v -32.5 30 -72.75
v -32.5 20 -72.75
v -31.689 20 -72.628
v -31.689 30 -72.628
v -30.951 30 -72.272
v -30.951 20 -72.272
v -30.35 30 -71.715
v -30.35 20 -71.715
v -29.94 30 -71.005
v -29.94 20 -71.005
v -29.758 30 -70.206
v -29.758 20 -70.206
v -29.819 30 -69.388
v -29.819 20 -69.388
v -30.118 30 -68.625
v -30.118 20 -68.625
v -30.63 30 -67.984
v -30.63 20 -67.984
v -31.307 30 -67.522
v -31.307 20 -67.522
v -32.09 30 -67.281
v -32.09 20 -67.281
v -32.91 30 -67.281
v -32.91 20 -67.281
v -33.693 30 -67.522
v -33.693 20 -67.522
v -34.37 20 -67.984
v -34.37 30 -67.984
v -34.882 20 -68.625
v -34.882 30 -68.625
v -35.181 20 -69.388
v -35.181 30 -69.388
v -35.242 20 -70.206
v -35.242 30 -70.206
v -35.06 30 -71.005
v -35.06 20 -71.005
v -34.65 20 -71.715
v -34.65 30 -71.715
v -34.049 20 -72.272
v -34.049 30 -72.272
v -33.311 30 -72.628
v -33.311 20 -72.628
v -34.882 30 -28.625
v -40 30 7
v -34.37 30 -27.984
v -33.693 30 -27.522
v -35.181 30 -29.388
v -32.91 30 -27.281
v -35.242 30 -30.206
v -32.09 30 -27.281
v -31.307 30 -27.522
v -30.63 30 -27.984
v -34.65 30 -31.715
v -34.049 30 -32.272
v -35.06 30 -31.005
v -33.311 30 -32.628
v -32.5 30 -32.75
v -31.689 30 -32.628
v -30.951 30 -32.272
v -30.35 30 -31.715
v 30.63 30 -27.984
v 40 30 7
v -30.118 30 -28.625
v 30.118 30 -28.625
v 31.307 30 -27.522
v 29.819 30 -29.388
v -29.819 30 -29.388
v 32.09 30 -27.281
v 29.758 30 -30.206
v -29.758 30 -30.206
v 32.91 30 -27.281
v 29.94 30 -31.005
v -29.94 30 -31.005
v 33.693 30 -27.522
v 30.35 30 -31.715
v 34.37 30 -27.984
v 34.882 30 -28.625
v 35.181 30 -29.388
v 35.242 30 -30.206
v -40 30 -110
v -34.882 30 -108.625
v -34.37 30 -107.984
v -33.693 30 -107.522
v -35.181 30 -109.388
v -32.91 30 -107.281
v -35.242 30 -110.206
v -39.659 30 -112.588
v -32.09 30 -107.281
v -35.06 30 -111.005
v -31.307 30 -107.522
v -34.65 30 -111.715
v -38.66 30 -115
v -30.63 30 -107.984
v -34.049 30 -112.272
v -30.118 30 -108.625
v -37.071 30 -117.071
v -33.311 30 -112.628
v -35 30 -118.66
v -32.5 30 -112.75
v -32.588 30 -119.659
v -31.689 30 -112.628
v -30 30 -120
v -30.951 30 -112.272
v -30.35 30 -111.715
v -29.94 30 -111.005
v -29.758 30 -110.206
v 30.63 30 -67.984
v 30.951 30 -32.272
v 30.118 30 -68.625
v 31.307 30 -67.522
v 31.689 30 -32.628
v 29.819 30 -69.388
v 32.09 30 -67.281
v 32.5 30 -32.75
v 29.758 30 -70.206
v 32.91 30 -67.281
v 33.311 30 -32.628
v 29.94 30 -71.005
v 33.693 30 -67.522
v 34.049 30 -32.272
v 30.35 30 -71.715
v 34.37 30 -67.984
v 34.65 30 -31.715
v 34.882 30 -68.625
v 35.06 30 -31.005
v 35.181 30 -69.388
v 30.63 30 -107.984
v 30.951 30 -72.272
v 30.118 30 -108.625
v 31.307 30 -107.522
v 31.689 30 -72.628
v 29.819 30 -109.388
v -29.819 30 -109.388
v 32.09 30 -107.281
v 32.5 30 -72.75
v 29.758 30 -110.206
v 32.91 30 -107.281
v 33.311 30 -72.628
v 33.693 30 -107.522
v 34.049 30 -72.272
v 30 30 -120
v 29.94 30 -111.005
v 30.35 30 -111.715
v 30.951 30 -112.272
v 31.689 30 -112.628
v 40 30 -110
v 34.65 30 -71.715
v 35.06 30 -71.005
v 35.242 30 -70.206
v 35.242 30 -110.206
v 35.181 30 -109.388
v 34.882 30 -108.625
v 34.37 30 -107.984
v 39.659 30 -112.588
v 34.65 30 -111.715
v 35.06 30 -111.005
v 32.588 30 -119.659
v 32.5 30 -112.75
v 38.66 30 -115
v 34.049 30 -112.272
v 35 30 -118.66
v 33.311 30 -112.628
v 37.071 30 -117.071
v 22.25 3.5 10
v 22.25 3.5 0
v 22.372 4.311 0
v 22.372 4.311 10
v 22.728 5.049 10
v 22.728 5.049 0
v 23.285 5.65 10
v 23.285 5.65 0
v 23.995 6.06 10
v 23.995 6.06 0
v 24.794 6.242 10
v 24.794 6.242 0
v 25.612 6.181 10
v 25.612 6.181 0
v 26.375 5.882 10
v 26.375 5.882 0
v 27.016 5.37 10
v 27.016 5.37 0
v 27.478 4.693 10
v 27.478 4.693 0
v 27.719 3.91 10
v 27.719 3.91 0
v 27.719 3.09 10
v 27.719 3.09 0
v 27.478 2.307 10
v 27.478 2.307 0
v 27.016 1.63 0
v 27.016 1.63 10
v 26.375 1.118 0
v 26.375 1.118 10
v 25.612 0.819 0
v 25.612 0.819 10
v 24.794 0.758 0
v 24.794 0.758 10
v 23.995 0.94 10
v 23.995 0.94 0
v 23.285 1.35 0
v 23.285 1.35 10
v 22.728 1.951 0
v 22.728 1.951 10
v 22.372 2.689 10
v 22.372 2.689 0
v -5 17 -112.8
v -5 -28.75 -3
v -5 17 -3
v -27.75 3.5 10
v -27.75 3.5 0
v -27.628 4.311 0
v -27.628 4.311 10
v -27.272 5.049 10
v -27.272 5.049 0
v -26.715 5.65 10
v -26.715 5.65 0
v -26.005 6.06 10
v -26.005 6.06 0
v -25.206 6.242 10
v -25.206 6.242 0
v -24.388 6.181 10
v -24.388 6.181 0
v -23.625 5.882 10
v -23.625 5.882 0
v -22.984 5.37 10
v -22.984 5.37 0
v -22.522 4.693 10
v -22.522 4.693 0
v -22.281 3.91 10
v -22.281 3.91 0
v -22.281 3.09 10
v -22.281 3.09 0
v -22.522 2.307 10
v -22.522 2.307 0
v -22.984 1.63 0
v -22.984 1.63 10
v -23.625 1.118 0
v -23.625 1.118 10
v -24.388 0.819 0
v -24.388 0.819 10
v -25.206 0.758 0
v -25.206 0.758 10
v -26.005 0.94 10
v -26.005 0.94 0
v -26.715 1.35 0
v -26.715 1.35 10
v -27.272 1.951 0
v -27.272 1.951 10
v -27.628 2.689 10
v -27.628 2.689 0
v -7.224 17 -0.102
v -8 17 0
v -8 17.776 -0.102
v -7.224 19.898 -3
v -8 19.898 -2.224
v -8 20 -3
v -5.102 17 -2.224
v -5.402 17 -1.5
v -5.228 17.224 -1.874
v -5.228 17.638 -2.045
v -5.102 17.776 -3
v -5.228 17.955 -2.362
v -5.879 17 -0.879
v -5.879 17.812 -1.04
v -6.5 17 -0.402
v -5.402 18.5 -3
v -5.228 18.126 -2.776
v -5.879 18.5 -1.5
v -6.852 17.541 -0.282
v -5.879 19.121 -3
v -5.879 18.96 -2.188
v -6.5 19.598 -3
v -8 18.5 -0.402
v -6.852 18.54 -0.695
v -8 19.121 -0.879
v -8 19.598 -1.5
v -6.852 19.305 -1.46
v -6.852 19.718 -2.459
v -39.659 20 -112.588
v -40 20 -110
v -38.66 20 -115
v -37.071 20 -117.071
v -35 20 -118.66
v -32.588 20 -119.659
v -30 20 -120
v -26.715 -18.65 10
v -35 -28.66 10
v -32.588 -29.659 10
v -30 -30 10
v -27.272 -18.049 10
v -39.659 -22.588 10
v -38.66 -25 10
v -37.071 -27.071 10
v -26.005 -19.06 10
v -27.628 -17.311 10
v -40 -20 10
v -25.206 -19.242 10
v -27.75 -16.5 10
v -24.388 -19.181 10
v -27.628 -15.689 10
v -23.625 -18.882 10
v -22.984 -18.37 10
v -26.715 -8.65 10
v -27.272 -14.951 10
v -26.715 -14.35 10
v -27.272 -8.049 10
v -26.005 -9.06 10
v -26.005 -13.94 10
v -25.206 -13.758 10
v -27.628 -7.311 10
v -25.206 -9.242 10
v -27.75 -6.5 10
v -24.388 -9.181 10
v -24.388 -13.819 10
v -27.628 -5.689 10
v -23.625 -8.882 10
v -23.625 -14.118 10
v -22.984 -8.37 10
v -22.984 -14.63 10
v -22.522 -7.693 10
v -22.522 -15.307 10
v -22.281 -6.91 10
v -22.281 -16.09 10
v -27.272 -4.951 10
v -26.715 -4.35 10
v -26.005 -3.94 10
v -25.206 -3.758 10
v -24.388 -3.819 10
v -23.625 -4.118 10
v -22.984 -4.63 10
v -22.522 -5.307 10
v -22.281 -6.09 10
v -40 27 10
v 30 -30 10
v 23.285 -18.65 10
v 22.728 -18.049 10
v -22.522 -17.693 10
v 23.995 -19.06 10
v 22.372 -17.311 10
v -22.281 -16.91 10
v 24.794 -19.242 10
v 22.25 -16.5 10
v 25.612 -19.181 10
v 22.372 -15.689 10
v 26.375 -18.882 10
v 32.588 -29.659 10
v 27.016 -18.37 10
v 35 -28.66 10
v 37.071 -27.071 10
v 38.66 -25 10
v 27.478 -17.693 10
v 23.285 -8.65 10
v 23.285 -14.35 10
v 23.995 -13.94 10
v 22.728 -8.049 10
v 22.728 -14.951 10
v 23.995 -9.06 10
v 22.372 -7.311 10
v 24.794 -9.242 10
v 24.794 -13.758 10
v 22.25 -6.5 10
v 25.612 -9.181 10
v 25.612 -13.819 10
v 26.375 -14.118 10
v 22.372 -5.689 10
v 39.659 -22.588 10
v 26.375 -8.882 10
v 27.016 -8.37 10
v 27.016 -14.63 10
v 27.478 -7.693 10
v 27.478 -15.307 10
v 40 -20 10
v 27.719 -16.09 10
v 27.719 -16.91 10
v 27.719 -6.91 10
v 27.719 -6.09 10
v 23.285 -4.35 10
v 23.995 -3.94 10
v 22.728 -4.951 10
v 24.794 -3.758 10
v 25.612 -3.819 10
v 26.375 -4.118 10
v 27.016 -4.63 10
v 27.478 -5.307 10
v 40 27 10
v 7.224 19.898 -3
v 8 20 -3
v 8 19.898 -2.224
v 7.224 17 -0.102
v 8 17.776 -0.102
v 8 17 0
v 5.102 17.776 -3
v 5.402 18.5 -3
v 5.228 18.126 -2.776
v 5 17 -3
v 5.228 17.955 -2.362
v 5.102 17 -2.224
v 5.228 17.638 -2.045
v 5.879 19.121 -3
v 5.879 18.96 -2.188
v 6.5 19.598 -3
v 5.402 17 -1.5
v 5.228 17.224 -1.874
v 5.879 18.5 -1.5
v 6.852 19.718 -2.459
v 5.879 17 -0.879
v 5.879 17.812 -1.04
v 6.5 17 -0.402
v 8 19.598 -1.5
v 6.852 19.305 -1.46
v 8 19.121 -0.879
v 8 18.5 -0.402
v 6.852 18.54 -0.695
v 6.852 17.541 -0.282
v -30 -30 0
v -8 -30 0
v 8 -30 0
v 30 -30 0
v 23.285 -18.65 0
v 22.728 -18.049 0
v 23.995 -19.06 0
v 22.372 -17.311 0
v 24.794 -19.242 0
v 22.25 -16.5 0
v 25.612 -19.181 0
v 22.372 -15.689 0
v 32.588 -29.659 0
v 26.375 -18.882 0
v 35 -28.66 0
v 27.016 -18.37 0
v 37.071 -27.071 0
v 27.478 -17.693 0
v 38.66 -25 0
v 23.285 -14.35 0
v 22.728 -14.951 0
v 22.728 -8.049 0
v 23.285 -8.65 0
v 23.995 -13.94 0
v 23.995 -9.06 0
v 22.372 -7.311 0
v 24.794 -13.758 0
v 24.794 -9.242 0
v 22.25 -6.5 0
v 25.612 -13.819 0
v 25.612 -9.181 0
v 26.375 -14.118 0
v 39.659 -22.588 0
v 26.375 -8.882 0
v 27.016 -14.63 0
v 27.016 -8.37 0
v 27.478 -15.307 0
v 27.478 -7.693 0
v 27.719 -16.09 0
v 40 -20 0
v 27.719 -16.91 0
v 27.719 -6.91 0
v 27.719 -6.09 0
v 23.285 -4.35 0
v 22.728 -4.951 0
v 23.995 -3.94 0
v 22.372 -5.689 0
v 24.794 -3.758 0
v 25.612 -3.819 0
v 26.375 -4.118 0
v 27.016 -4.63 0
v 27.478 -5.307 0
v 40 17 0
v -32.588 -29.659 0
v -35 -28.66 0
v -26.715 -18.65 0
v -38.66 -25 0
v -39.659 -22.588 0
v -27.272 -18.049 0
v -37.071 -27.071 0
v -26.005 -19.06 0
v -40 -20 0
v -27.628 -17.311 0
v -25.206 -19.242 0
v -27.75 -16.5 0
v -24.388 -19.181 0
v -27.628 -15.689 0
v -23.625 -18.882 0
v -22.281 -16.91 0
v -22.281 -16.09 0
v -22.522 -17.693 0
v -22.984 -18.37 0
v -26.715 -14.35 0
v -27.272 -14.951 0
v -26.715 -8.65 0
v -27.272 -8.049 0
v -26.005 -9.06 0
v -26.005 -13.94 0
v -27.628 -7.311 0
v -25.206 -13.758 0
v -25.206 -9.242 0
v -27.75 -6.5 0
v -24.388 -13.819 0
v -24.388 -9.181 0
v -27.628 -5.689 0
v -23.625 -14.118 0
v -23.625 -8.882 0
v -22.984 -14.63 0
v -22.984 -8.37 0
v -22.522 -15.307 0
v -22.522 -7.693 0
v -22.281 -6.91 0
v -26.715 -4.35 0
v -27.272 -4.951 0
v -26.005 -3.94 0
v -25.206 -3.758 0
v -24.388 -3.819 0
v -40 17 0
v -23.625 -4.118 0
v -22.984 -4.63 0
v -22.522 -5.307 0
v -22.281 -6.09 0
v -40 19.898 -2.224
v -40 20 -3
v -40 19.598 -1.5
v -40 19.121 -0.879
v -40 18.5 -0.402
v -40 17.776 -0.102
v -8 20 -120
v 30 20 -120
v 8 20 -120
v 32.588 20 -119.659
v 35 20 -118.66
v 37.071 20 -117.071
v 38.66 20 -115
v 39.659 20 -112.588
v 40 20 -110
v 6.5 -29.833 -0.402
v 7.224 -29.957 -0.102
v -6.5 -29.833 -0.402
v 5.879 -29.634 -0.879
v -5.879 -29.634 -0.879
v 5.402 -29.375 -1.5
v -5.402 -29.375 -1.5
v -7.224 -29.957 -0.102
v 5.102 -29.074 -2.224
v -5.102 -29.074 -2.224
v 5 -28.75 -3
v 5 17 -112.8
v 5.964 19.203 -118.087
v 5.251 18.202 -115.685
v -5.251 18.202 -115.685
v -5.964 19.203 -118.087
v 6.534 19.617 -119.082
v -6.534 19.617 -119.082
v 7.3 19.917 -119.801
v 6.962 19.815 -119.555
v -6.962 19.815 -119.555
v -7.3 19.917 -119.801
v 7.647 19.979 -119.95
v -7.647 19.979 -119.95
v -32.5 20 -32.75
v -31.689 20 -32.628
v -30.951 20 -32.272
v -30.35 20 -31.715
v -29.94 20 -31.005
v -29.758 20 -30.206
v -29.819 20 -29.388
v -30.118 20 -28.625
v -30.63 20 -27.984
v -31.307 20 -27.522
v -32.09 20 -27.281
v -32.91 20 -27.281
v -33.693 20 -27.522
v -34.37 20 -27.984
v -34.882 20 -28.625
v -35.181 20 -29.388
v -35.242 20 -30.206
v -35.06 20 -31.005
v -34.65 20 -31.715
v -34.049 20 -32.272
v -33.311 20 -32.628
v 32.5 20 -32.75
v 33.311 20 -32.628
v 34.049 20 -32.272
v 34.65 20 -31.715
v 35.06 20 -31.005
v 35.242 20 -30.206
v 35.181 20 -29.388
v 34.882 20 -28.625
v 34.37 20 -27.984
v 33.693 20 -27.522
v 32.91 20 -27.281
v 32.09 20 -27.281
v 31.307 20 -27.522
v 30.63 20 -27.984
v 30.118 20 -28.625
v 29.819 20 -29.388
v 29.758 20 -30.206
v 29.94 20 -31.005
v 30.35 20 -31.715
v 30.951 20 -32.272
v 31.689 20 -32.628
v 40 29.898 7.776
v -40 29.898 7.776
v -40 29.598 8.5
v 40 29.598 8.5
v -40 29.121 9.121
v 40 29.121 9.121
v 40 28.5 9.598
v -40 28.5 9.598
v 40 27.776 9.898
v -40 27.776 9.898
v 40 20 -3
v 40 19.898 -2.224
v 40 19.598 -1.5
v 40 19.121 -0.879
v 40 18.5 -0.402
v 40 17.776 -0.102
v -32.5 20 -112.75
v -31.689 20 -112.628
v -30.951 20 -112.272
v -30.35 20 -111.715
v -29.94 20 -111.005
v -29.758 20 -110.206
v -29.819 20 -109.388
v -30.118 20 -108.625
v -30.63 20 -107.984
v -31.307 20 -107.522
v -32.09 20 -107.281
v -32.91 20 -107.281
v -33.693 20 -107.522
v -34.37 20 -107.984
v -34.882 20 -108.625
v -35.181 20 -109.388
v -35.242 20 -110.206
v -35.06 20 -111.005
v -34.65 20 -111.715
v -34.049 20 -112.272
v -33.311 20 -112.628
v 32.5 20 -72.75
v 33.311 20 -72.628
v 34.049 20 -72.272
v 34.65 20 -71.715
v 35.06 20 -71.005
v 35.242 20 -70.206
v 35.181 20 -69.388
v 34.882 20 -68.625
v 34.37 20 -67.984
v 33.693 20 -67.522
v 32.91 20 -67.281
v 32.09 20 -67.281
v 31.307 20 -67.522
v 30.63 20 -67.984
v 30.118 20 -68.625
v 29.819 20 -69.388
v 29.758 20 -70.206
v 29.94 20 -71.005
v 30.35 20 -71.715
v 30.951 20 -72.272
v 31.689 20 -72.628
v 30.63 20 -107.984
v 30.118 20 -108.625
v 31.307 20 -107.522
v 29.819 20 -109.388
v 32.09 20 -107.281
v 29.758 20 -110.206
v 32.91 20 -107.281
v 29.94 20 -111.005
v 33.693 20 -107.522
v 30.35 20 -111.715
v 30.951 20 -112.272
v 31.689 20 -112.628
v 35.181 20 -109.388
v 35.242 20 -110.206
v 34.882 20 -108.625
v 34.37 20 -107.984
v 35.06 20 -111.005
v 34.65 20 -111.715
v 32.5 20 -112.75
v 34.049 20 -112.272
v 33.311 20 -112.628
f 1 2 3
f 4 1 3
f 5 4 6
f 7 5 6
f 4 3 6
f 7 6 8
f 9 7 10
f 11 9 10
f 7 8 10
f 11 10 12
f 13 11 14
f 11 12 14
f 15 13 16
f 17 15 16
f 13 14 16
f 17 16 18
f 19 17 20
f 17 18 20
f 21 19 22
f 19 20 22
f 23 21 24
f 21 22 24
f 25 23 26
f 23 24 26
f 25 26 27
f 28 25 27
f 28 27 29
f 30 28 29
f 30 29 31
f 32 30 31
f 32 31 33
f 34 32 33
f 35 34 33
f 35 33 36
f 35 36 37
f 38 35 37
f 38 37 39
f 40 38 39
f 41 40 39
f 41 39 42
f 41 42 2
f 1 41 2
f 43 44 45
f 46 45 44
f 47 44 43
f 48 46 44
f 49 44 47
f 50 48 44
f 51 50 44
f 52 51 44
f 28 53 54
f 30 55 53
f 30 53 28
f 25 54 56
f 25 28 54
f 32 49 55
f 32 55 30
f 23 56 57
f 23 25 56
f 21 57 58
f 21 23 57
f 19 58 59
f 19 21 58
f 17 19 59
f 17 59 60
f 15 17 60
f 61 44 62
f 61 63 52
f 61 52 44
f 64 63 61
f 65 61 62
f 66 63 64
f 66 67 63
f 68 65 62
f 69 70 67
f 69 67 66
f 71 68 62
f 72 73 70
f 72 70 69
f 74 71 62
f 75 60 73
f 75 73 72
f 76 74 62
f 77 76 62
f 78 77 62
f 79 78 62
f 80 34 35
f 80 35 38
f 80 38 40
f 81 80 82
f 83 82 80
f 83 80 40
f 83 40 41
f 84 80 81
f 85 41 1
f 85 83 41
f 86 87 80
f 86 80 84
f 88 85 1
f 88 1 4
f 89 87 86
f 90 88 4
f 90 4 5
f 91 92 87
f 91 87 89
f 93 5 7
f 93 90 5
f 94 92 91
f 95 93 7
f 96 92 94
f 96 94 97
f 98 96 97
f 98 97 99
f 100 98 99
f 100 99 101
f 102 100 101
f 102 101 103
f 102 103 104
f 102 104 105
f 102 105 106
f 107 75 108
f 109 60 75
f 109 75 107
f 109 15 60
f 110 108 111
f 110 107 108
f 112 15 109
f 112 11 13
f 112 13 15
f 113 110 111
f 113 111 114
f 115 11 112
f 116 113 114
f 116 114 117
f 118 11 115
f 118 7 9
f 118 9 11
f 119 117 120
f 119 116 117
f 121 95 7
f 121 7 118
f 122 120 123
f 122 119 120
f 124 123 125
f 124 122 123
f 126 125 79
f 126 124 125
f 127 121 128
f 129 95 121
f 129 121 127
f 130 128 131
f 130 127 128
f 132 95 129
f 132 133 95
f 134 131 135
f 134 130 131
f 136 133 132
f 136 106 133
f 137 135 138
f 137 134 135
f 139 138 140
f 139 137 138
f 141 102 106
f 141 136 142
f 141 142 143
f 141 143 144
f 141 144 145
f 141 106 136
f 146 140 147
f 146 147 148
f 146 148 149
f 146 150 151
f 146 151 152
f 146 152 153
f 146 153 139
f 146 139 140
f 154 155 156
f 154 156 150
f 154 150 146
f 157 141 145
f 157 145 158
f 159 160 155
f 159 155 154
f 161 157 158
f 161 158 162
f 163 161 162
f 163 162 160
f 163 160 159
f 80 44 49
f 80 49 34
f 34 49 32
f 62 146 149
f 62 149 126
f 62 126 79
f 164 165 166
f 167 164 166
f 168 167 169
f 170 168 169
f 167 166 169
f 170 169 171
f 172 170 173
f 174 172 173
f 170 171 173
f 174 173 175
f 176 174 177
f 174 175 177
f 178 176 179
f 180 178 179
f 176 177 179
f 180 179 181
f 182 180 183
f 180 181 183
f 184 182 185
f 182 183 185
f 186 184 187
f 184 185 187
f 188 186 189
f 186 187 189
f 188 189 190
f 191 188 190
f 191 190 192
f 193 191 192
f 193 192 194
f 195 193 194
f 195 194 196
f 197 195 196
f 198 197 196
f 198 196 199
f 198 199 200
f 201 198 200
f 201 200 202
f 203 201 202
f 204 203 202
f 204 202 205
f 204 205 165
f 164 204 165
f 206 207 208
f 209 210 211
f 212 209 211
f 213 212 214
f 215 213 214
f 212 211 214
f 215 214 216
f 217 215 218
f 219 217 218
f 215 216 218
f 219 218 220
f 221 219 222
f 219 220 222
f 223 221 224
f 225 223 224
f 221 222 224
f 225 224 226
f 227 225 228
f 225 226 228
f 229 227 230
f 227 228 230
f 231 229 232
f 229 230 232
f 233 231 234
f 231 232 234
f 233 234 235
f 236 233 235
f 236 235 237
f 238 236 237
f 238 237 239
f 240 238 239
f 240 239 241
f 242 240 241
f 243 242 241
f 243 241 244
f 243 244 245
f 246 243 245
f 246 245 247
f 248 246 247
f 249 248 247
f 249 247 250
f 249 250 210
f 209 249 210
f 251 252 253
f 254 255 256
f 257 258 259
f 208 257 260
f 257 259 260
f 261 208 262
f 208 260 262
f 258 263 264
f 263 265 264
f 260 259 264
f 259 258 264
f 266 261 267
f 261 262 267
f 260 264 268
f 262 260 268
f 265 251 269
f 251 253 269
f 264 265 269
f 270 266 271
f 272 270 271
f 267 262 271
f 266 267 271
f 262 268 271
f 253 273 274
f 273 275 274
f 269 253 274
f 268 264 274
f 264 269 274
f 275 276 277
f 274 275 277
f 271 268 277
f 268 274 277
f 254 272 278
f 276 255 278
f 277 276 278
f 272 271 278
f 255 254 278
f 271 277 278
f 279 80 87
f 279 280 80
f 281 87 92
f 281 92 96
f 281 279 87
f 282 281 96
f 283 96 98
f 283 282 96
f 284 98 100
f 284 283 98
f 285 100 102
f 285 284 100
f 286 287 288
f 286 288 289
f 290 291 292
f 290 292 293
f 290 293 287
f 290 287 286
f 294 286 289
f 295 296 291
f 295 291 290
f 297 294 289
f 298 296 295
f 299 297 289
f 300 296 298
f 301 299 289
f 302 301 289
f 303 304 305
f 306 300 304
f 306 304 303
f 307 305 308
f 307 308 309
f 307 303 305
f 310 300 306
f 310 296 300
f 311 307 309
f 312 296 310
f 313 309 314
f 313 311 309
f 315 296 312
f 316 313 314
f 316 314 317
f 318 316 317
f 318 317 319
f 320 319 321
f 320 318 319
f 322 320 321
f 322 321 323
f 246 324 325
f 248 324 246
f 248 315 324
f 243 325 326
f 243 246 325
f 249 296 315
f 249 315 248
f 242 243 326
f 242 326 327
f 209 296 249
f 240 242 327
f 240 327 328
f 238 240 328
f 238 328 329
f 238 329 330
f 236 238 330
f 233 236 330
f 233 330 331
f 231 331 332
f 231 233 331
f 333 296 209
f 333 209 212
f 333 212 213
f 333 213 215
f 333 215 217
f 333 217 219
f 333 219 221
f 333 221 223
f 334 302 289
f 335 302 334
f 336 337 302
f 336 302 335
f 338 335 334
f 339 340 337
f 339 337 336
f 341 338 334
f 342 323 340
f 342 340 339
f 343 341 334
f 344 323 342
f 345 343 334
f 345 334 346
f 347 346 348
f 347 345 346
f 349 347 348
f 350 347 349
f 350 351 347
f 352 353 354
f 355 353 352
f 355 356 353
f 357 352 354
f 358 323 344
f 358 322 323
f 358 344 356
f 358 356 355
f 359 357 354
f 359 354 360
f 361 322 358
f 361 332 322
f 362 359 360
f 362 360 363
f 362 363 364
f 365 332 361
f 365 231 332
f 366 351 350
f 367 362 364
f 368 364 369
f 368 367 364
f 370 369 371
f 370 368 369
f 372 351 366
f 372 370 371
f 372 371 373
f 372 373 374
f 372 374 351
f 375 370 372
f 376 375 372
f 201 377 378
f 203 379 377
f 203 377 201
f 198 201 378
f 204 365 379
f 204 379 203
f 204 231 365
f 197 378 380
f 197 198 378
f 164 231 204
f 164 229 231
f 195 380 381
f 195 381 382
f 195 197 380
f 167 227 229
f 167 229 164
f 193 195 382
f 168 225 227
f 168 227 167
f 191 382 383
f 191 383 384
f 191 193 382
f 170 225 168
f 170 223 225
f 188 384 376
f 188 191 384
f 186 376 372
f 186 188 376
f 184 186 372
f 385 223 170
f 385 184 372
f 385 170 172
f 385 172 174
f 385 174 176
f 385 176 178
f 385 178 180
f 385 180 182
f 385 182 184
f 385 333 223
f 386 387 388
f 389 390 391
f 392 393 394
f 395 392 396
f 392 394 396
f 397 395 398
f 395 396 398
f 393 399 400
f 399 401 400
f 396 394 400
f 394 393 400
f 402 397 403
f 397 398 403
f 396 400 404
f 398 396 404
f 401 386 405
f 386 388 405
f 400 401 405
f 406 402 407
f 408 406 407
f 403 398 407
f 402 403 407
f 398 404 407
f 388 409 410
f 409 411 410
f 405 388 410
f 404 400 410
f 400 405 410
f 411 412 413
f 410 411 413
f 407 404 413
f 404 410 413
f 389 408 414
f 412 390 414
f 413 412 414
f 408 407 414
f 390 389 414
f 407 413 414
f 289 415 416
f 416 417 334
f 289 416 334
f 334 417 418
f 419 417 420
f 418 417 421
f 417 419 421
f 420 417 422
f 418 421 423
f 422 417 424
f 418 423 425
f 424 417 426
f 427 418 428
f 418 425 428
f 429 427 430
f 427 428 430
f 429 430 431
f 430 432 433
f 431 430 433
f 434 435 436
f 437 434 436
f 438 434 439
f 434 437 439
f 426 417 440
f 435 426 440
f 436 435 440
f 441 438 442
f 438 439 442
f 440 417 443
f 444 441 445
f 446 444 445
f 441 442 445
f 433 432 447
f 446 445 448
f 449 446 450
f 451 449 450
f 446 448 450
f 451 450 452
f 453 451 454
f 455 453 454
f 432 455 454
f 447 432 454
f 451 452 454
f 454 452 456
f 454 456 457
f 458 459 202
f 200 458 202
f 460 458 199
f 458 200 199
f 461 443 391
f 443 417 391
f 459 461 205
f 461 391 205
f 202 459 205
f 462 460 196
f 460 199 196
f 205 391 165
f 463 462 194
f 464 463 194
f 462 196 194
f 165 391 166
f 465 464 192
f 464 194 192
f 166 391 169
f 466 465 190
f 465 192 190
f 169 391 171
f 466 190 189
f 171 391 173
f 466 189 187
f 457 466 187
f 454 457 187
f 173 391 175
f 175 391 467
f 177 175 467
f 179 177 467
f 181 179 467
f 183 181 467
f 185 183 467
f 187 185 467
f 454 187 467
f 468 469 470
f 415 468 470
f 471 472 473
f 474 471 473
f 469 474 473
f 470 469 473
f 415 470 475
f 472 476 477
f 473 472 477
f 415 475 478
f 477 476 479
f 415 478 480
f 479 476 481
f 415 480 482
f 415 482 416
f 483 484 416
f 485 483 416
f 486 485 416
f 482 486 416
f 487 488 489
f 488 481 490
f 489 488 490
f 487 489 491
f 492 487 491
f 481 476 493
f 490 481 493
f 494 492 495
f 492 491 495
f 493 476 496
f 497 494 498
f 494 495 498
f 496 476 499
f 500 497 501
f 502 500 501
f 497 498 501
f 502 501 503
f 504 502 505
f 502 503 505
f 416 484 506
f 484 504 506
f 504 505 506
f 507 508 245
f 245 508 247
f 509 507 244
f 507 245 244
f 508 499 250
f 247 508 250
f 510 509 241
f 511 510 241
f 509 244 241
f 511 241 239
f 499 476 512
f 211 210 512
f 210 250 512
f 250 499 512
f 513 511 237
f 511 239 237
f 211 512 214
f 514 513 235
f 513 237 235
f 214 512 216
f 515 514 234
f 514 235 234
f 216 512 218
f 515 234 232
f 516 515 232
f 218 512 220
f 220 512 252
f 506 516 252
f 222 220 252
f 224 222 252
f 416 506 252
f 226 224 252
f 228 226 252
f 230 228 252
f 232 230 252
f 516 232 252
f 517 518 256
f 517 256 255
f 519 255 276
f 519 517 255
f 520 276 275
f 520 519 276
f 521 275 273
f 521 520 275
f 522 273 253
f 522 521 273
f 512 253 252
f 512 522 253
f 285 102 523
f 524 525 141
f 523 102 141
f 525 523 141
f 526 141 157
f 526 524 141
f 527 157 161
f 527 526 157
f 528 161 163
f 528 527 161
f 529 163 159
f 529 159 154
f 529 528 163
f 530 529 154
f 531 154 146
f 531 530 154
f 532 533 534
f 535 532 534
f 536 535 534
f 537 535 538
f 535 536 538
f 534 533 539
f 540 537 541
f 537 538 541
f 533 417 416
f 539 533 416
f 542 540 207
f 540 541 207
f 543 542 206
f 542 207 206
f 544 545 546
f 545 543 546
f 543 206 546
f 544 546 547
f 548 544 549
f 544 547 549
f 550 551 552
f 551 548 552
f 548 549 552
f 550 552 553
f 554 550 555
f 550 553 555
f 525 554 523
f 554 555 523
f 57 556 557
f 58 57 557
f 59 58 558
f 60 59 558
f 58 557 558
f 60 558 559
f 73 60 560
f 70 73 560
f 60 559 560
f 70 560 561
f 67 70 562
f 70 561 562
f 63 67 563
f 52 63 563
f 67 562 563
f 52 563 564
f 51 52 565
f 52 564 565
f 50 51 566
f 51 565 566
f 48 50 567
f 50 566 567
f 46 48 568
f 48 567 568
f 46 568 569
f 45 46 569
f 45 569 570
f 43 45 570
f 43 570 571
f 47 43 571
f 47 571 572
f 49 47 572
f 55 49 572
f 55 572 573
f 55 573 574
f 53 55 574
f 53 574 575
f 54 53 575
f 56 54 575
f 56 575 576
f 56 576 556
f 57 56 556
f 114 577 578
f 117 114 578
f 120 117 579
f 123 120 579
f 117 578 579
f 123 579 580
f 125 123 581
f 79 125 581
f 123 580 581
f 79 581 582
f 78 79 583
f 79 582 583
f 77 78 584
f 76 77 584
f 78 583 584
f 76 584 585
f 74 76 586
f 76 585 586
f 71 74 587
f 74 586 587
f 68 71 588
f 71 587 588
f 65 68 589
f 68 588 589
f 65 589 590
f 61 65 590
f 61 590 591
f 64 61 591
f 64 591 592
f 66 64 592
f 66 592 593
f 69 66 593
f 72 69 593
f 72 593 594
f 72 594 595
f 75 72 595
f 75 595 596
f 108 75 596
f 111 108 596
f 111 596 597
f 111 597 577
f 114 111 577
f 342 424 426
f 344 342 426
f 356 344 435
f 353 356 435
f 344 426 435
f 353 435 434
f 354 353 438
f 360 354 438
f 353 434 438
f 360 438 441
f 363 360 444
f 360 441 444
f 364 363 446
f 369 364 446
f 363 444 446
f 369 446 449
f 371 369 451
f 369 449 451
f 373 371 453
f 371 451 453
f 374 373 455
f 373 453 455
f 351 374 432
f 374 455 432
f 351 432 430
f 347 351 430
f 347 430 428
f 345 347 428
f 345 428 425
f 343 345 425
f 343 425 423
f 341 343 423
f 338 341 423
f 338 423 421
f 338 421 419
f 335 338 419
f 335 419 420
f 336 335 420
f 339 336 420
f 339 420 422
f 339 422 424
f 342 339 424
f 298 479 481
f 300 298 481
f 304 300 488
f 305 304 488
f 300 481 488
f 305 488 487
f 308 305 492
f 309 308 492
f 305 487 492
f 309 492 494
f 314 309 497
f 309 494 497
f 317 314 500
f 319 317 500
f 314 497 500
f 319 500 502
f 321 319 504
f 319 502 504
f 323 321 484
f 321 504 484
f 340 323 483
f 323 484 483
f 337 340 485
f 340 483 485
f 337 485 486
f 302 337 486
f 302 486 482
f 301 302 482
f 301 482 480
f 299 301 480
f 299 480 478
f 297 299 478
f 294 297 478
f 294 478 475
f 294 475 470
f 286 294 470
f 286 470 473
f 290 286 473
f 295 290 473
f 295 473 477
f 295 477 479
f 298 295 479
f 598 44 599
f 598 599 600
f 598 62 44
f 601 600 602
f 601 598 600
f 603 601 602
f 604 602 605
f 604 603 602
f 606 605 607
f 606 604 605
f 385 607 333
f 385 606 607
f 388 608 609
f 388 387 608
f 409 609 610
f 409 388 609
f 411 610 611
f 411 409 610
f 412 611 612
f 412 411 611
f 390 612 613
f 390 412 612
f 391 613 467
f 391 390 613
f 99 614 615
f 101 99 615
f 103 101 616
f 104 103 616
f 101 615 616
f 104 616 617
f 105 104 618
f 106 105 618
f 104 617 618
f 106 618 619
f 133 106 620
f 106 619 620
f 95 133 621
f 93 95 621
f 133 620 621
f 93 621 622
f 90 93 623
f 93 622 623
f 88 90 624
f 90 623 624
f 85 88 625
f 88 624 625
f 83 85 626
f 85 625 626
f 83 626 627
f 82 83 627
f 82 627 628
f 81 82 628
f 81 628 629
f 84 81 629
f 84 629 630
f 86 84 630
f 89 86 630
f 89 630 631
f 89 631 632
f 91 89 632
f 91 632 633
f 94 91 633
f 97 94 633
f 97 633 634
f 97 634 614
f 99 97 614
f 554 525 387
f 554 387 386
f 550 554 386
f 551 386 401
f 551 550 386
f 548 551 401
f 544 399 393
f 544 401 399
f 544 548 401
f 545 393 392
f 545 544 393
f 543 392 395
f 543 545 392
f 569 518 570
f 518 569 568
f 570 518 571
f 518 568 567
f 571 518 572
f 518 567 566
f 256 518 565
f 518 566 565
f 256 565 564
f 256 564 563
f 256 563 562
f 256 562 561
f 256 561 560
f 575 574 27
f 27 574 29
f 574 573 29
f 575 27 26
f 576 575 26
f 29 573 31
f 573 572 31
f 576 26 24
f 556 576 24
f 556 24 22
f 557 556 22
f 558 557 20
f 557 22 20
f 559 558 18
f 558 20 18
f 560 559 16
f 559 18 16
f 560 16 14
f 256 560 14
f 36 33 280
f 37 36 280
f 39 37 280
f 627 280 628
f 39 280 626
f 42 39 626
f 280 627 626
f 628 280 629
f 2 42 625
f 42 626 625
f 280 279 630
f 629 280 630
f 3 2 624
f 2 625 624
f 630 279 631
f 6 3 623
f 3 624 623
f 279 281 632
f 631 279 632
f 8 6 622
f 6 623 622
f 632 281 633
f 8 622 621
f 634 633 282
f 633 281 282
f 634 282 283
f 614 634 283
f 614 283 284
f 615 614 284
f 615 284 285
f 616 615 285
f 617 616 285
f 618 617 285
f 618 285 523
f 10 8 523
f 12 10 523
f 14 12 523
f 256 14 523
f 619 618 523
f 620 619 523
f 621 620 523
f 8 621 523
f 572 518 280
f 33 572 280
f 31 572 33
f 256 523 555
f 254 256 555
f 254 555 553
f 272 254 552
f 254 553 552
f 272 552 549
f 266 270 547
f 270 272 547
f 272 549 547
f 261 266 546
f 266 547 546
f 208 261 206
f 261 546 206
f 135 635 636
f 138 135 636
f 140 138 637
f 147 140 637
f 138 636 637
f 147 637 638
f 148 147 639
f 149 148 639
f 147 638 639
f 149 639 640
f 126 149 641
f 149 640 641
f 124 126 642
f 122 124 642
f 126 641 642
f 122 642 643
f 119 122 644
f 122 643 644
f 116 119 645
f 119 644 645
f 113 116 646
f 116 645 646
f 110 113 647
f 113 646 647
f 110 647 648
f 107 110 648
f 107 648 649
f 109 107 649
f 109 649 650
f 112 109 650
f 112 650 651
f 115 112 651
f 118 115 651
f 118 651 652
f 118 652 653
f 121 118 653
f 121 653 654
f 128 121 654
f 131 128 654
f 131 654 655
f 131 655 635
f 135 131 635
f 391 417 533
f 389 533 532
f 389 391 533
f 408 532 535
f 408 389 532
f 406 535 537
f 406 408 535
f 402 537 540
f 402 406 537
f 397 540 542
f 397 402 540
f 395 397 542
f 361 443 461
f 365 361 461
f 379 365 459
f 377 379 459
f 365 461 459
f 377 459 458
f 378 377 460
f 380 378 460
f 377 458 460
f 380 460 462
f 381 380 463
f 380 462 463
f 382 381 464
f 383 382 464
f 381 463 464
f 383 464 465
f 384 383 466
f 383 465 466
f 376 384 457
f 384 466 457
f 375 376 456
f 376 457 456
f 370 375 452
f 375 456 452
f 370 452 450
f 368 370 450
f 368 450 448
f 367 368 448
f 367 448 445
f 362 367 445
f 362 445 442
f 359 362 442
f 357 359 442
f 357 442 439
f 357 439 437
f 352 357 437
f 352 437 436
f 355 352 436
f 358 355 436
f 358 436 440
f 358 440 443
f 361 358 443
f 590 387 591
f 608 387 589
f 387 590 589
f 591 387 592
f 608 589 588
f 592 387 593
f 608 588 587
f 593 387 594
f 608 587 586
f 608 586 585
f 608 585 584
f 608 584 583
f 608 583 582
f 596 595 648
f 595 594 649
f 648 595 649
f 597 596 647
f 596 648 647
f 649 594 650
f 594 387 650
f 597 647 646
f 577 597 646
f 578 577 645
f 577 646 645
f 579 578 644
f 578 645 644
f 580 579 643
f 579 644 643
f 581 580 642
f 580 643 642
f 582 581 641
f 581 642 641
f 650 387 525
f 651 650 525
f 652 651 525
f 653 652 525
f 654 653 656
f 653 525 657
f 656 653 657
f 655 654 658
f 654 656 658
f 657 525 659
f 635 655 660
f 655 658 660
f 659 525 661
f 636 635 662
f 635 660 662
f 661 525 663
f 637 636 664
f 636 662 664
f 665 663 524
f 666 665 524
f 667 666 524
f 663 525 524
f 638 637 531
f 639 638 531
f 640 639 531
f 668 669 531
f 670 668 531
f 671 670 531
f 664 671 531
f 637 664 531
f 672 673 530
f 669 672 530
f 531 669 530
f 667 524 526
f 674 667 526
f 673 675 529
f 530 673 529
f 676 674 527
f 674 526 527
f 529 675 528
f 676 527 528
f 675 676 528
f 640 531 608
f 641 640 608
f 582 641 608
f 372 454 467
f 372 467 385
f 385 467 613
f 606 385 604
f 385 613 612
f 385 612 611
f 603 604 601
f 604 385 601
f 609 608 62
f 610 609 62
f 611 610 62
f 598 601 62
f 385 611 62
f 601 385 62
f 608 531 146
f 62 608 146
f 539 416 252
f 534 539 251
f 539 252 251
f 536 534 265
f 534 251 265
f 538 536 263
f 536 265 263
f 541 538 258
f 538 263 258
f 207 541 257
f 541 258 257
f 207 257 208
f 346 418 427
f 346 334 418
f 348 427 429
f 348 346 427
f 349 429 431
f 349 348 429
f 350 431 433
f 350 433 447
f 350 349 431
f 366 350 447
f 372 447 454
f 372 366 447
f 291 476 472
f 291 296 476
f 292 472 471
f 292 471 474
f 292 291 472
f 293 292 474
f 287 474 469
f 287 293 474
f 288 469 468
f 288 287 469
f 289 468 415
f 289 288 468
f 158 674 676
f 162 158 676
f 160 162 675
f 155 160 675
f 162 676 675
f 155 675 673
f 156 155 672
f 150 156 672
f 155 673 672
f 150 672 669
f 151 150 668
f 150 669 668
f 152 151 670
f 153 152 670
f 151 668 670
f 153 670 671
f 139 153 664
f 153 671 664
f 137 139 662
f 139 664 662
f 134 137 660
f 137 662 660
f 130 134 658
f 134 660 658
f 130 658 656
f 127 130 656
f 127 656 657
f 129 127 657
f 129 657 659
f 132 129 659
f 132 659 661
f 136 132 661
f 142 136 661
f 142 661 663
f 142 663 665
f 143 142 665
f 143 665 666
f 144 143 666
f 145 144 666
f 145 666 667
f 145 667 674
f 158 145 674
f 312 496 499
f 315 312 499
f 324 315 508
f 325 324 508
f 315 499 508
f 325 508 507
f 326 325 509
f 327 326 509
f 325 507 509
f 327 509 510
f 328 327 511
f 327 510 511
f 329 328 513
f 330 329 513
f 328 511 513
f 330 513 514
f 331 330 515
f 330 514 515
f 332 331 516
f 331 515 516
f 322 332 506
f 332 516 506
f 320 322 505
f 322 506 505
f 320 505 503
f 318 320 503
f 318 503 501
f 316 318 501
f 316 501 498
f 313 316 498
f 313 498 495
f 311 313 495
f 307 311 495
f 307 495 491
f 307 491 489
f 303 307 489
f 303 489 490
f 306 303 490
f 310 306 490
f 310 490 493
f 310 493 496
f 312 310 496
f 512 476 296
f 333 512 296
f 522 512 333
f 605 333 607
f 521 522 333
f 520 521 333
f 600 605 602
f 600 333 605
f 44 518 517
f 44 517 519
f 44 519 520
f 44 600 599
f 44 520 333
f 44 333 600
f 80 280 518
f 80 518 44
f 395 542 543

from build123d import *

# Parameters (mm, degrees)
SKETCH1_W           = 80
SKETCH1_H           = 60
BOSS_EXTRUDE1_DEPTH = 10
SKETCH2_W           = 80
SKETCH2_H           = 130
BOSS_EXTRUDE2_DEPTH = 10
CUT_EXTRUDE1_REACH  = 132
SKETCH3_R           = 2.75
CUT_EXTRUDE2_REACH  = 138.015
SKETCH4_R           = 2.75
SKETCH5_W           = 10
SKETCH5_H           = 50
BOSS_EXTRUDE3_DEPTH = 120
CUT_EXTRUDE3_REACH  = 133.624
FILLET1_R           = 10
FILLET2_R           = 3
FILLET3_R           = 3


with BuildPart() as part:
    # Sketch1 → Boss-Extrude1 (new body)
    with BuildSketch(Plane.XY):
        Rectangle(SKETCH1_W, SKETCH1_H)
    extrude(amount=BOSS_EXTRUDE1_DEPTH)

    # Sketch2 → Boss-Extrude2 (add)
    with BuildSketch(Plane(origin=(0, 30, 0), x_dir=(1, 0, 0), z_dir=(0, 1, 0))):
        with Locations((0, 55)):
            Rectangle(SKETCH2_W, SKETCH2_H)
    extrude(amount=-BOSS_EXTRUDE2_DEPTH)

    # Sketch3 → Cut-Extrude1 (cut, up to next)
    with BuildSketch(Plane(origin=(0, 0, 0), x_dir=(-1, 0, 0), z_dir=(0, 0, -1)), mode=Mode.PRIVATE) as cut_extrude1_sk1:
        with Locations((-25, -16.5)):
            Circle(SKETCH3_R)
    cut_extrude1_tool1 = extrude(cut_extrude1_sk1.sketch, amount=-CUT_EXTRUDE1_REACH, mode=Mode.PRIVATE) & part.part
    # Sketch3 → Cut-Extrude1 (cut, up to next)
    with BuildSketch(Plane(origin=(0, 0, 0), x_dir=(-1, 0, 0), z_dir=(0, 0, -1)), mode=Mode.PRIVATE) as cut_extrude1_sk2:
        with Locations((25, -16.5)):
            Circle(SKETCH3_R)
    cut_extrude1_tool2 = extrude(cut_extrude1_sk2.sketch, amount=-CUT_EXTRUDE1_REACH, mode=Mode.PRIVATE) & part.part
    # Sketch3 → Cut-Extrude1 (cut, up to next)
    with BuildSketch(Plane(origin=(0, 0, 0), x_dir=(-1, 0, 0), z_dir=(0, 0, -1)), mode=Mode.PRIVATE) as cut_extrude1_sk3:
        with Locations((-25, -6.5)):
            Circle(SKETCH3_R)
    cut_extrude1_tool3 = extrude(cut_extrude1_sk3.sketch, amount=-CUT_EXTRUDE1_REACH, mode=Mode.PRIVATE) & part.part
    # Sketch3 → Cut-Extrude1 (cut, up to next)
    with BuildSketch(Plane(origin=(0, 0, 0), x_dir=(-1, 0, 0), z_dir=(0, 0, -1)), mode=Mode.PRIVATE) as cut_extrude1_sk4:
        with Locations((25, -6.5)):
            Circle(SKETCH3_R)
    cut_extrude1_tool4 = extrude(cut_extrude1_sk4.sketch, amount=-CUT_EXTRUDE1_REACH, mode=Mode.PRIVATE) & part.part
    # Sketch3 → Cut-Extrude1 (cut, up to next)
    with BuildSketch(Plane(origin=(0, 0, 0), x_dir=(-1, 0, 0), z_dir=(0, 0, -1)), mode=Mode.PRIVATE) as cut_extrude1_sk5:
        with Locations((-25, 3.5)):
            Circle(SKETCH3_R)
    cut_extrude1_tool5 = extrude(cut_extrude1_sk5.sketch, amount=-CUT_EXTRUDE1_REACH, mode=Mode.PRIVATE) & part.part
    # Sketch3 → Cut-Extrude1 (cut, up to next)
    with BuildSketch(Plane(origin=(0, 0, 0), x_dir=(-1, 0, 0), z_dir=(0, 0, -1)), mode=Mode.PRIVATE) as cut_extrude1_sk6:
        with Locations((25, 3.5)):
            Circle(SKETCH3_R)
    cut_extrude1_tool6 = extrude(cut_extrude1_sk6.sketch, amount=-CUT_EXTRUDE1_REACH, mode=Mode.PRIVATE) & part.part
    add(cut_extrude1_tool1.solids().sort_by_distance((25, -16.5, 0))[0], mode=Mode.SUBTRACT)
    add(cut_extrude1_tool2.solids().sort_by_distance((-25, -16.5, 0))[0], mode=Mode.SUBTRACT)
    add(cut_extrude1_tool3.solids().sort_by_distance((25, -6.5, 0))[0], mode=Mode.SUBTRACT)
    add(cut_extrude1_tool4.solids().sort_by_distance((-25, -6.5, 0))[0], mode=Mode.SUBTRACT)
    add(cut_extrude1_tool5.solids().sort_by_distance((25, 3.5, 0))[0], mode=Mode.SUBTRACT)
    add(cut_extrude1_tool6.solids().sort_by_distance((-25, 3.5, 0))[0], mode=Mode.SUBTRACT)

    # Sketch4 → Cut-Extrude2 (cut, up to next)
    with BuildSketch(Plane.XZ.offset(-20), mode=Mode.PRIVATE) as cut_extrude2_sk1:
        with Locations(Location((-32.5, -110, 0), (0, 0, 270))):
            Circle(SKETCH4_R)
    cut_extrude2_tool1 = extrude(cut_extrude2_sk1.sketch, amount=-CUT_EXTRUDE2_REACH, mode=Mode.PRIVATE) & part.part
    # Sketch4 → Cut-Extrude2 (cut, up to next)
    with BuildSketch(Plane.XZ.offset(-20), mode=Mode.PRIVATE) as cut_extrude2_sk2:
        with Locations(Location((32.5, -110, 0), (0, 0, 270))):
            Circle(SKETCH4_R)
    cut_extrude2_tool2 = extrude(cut_extrude2_sk2.sketch, amount=-CUT_EXTRUDE2_REACH, mode=Mode.PRIVATE) & part.part
    # Sketch4 → Cut-Extrude2 (cut, up to next)
    with BuildSketch(Plane.XZ.offset(-20), mode=Mode.PRIVATE) as cut_extrude2_sk3:
        with Locations(Location((-32.5, -70, 0), (0, 0, 270))):
            Circle(SKETCH4_R)
    cut_extrude2_tool3 = extrude(cut_extrude2_sk3.sketch, amount=-CUT_EXTRUDE2_REACH, mode=Mode.PRIVATE) & part.part
    # Sketch4 → Cut-Extrude2 (cut, up to next)
    with BuildSketch(Plane.XZ.offset(-20), mode=Mode.PRIVATE) as cut_extrude2_sk4:
        with Locations(Location((32.5, -70, 0), (0, 0, 270))):
            Circle(SKETCH4_R)
    cut_extrude2_tool4 = extrude(cut_extrude2_sk4.sketch, amount=-CUT_EXTRUDE2_REACH, mode=Mode.PRIVATE) & part.part
    # Sketch4 → Cut-Extrude2 (cut, up to next)
    with BuildSketch(Plane.XZ.offset(-20), mode=Mode.PRIVATE) as cut_extrude2_sk5:
        with Locations(Location((-32.5, -30, 0), (0, 0, 270))):
            Circle(SKETCH4_R)
    cut_extrude2_tool5 = extrude(cut_extrude2_sk5.sketch, amount=-CUT_EXTRUDE2_REACH, mode=Mode.PRIVATE) & part.part
    # Sketch4 → Cut-Extrude2 (cut, up to next)
    with BuildSketch(Plane.XZ.offset(-20), mode=Mode.PRIVATE) as cut_extrude2_sk6:
        with Locations(Location((32.5, -30, 0), (0, 0, 270))):
            Circle(SKETCH4_R)
    cut_extrude2_tool6 = extrude(cut_extrude2_sk6.sketch, amount=-CUT_EXTRUDE2_REACH, mode=Mode.PRIVATE) & part.part
    add(cut_extrude2_tool1.solids().sort_by_distance((-32.5, 20, -110))[0], mode=Mode.SUBTRACT)
    add(cut_extrude2_tool2.solids().sort_by_distance((32.5, 20, -110))[0], mode=Mode.SUBTRACT)
    add(cut_extrude2_tool3.solids().sort_by_distance((-32.5, 20, -70))[0], mode=Mode.SUBTRACT)
    add(cut_extrude2_tool4.solids().sort_by_distance((32.5, 20, -70))[0], mode=Mode.SUBTRACT)
    add(cut_extrude2_tool5.solids().sort_by_distance((-32.5, 20, -30))[0], mode=Mode.SUBTRACT)
    add(cut_extrude2_tool6.solids().sort_by_distance((32.5, 20, -30))[0], mode=Mode.SUBTRACT)

    # Sketch5 → Boss-Extrude3 (add)
    with BuildSketch(Plane(origin=(0, 0, 0), x_dir=(-1, 0, 0), z_dir=(0, 0, -1))):
        with Locations((0, -5)):
            Rectangle(SKETCH5_W, SKETCH5_H)
    extrude(amount=BOSS_EXTRUDE3_DEPTH)

    # Sketch6 → Cut-Extrude3 (cut, up to next)
    with BuildSketch(Plane.ZY.offset(5), mode=Mode.PRIVATE) as cut_extrude3_sk1:
        Polygon((-120, 20), (-120, -30), (0, -30), align=None)
    cut_extrude3_tool1 = extrude(cut_extrude3_sk1.sketch, amount=-CUT_EXTRUDE3_REACH, mode=Mode.PRIVATE) & part.part
    add(cut_extrude3_tool1.solids().sort_by_distance((-5, -13.333333, -80))[0], mode=Mode.SUBTRACT)

    # Fillet1
    fillet1_edges = [part.edges().sort_by_distance(p)[0] for p in [
        (40, 25, -120),
        (-40, 25, -120),
        (40, -30, 5),
        (-40, -30, 5),
    ]]
    fillet(fillet1_edges, radius=FILLET1_R)

    # Fillet2
    fillet2_edges = [part.edges().sort_by_distance(p)[0] for p in [
        (0, 30, 10),
    ]]
    fillet(fillet2_edges, radius=FILLET2_R)

    # Fillet3
    fillet3_edges = [part.edges().sort_by_distance(p)[0] for p in [
        (22.5, 20, 0),
        (-22.5, 20, 0),
        (-5, -5, 0),
        (-5, 20, -60),
        (5, 20, -60),
        (5, -5, 0),
    ]]
    fillet(fillet3_edges, radius=FILLET3_R)


solid = part.part
